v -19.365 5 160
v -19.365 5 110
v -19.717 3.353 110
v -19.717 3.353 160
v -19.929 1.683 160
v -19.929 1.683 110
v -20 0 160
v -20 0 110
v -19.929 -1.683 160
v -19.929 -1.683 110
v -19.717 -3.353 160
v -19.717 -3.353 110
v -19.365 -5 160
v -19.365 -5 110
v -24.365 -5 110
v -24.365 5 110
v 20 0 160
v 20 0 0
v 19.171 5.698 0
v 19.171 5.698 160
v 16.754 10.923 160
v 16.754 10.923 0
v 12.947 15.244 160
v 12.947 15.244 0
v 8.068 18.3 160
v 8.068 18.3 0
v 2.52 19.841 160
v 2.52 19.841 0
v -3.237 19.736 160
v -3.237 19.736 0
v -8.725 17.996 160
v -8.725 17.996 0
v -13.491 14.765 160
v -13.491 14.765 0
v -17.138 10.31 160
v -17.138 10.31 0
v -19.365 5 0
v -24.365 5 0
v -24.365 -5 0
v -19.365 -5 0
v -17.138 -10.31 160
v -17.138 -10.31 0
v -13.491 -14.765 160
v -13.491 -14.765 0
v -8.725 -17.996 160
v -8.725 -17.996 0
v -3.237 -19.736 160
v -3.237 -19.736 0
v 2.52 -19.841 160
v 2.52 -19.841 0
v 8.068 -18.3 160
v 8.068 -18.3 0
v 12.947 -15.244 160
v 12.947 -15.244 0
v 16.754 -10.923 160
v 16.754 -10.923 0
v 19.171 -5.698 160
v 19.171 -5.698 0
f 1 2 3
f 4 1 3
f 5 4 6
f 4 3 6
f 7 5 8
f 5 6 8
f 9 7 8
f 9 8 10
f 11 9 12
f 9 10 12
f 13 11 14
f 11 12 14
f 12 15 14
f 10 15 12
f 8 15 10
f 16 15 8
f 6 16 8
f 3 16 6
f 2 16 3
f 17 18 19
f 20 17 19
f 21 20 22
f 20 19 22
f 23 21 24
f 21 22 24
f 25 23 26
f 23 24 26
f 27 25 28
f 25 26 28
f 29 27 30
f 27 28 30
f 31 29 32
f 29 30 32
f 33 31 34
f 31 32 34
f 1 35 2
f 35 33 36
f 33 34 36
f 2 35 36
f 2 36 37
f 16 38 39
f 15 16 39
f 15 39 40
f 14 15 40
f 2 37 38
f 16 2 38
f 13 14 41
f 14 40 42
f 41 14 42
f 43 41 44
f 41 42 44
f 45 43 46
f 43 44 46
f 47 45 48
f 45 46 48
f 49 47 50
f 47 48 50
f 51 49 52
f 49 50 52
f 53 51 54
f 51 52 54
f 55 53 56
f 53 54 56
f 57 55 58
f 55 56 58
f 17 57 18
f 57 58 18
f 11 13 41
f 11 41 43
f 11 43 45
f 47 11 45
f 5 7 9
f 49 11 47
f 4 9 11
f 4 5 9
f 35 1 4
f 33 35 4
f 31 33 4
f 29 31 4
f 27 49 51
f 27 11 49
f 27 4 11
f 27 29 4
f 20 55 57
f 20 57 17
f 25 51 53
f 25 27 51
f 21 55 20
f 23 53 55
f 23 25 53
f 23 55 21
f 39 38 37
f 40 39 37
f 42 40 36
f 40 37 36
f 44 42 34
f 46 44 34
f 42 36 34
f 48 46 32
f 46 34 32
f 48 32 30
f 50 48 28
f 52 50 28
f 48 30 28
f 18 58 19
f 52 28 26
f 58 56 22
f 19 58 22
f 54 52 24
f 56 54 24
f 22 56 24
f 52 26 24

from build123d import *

# Parameters (mm, degrees)
SKETCH1_R           = 20
BOSS_EXTRUDE1_DEPTH = 160
BOSS_EXTRUDE2_DEPTH = 110


with BuildPart() as part:
    # Sketch1 → Boss-Extrude1 (new body)
    with BuildSketch(Plane.XY):
        Circle(SKETCH1_R)
    extrude(amount=BOSS_EXTRUDE1_DEPTH)

    # Sketch1<3> → Boss-Extrude2 (add)
    with BuildSketch(Plane.XY):
        with BuildLine():
            Line((-24.364916731, 5), (-24.364916731, -5))
            Line((-24.364916731, -5), (-19.364916731, -5))
            ThreePointArc((-19.364916731, -5), (-20, 0), (-19.364916731, 5))
            Line((-19.364916731, 5), (-24.364916731, 5))
        make_face()
    extrude(amount=BOSS_EXTRUDE2_DEPTH)


solid = part.part
